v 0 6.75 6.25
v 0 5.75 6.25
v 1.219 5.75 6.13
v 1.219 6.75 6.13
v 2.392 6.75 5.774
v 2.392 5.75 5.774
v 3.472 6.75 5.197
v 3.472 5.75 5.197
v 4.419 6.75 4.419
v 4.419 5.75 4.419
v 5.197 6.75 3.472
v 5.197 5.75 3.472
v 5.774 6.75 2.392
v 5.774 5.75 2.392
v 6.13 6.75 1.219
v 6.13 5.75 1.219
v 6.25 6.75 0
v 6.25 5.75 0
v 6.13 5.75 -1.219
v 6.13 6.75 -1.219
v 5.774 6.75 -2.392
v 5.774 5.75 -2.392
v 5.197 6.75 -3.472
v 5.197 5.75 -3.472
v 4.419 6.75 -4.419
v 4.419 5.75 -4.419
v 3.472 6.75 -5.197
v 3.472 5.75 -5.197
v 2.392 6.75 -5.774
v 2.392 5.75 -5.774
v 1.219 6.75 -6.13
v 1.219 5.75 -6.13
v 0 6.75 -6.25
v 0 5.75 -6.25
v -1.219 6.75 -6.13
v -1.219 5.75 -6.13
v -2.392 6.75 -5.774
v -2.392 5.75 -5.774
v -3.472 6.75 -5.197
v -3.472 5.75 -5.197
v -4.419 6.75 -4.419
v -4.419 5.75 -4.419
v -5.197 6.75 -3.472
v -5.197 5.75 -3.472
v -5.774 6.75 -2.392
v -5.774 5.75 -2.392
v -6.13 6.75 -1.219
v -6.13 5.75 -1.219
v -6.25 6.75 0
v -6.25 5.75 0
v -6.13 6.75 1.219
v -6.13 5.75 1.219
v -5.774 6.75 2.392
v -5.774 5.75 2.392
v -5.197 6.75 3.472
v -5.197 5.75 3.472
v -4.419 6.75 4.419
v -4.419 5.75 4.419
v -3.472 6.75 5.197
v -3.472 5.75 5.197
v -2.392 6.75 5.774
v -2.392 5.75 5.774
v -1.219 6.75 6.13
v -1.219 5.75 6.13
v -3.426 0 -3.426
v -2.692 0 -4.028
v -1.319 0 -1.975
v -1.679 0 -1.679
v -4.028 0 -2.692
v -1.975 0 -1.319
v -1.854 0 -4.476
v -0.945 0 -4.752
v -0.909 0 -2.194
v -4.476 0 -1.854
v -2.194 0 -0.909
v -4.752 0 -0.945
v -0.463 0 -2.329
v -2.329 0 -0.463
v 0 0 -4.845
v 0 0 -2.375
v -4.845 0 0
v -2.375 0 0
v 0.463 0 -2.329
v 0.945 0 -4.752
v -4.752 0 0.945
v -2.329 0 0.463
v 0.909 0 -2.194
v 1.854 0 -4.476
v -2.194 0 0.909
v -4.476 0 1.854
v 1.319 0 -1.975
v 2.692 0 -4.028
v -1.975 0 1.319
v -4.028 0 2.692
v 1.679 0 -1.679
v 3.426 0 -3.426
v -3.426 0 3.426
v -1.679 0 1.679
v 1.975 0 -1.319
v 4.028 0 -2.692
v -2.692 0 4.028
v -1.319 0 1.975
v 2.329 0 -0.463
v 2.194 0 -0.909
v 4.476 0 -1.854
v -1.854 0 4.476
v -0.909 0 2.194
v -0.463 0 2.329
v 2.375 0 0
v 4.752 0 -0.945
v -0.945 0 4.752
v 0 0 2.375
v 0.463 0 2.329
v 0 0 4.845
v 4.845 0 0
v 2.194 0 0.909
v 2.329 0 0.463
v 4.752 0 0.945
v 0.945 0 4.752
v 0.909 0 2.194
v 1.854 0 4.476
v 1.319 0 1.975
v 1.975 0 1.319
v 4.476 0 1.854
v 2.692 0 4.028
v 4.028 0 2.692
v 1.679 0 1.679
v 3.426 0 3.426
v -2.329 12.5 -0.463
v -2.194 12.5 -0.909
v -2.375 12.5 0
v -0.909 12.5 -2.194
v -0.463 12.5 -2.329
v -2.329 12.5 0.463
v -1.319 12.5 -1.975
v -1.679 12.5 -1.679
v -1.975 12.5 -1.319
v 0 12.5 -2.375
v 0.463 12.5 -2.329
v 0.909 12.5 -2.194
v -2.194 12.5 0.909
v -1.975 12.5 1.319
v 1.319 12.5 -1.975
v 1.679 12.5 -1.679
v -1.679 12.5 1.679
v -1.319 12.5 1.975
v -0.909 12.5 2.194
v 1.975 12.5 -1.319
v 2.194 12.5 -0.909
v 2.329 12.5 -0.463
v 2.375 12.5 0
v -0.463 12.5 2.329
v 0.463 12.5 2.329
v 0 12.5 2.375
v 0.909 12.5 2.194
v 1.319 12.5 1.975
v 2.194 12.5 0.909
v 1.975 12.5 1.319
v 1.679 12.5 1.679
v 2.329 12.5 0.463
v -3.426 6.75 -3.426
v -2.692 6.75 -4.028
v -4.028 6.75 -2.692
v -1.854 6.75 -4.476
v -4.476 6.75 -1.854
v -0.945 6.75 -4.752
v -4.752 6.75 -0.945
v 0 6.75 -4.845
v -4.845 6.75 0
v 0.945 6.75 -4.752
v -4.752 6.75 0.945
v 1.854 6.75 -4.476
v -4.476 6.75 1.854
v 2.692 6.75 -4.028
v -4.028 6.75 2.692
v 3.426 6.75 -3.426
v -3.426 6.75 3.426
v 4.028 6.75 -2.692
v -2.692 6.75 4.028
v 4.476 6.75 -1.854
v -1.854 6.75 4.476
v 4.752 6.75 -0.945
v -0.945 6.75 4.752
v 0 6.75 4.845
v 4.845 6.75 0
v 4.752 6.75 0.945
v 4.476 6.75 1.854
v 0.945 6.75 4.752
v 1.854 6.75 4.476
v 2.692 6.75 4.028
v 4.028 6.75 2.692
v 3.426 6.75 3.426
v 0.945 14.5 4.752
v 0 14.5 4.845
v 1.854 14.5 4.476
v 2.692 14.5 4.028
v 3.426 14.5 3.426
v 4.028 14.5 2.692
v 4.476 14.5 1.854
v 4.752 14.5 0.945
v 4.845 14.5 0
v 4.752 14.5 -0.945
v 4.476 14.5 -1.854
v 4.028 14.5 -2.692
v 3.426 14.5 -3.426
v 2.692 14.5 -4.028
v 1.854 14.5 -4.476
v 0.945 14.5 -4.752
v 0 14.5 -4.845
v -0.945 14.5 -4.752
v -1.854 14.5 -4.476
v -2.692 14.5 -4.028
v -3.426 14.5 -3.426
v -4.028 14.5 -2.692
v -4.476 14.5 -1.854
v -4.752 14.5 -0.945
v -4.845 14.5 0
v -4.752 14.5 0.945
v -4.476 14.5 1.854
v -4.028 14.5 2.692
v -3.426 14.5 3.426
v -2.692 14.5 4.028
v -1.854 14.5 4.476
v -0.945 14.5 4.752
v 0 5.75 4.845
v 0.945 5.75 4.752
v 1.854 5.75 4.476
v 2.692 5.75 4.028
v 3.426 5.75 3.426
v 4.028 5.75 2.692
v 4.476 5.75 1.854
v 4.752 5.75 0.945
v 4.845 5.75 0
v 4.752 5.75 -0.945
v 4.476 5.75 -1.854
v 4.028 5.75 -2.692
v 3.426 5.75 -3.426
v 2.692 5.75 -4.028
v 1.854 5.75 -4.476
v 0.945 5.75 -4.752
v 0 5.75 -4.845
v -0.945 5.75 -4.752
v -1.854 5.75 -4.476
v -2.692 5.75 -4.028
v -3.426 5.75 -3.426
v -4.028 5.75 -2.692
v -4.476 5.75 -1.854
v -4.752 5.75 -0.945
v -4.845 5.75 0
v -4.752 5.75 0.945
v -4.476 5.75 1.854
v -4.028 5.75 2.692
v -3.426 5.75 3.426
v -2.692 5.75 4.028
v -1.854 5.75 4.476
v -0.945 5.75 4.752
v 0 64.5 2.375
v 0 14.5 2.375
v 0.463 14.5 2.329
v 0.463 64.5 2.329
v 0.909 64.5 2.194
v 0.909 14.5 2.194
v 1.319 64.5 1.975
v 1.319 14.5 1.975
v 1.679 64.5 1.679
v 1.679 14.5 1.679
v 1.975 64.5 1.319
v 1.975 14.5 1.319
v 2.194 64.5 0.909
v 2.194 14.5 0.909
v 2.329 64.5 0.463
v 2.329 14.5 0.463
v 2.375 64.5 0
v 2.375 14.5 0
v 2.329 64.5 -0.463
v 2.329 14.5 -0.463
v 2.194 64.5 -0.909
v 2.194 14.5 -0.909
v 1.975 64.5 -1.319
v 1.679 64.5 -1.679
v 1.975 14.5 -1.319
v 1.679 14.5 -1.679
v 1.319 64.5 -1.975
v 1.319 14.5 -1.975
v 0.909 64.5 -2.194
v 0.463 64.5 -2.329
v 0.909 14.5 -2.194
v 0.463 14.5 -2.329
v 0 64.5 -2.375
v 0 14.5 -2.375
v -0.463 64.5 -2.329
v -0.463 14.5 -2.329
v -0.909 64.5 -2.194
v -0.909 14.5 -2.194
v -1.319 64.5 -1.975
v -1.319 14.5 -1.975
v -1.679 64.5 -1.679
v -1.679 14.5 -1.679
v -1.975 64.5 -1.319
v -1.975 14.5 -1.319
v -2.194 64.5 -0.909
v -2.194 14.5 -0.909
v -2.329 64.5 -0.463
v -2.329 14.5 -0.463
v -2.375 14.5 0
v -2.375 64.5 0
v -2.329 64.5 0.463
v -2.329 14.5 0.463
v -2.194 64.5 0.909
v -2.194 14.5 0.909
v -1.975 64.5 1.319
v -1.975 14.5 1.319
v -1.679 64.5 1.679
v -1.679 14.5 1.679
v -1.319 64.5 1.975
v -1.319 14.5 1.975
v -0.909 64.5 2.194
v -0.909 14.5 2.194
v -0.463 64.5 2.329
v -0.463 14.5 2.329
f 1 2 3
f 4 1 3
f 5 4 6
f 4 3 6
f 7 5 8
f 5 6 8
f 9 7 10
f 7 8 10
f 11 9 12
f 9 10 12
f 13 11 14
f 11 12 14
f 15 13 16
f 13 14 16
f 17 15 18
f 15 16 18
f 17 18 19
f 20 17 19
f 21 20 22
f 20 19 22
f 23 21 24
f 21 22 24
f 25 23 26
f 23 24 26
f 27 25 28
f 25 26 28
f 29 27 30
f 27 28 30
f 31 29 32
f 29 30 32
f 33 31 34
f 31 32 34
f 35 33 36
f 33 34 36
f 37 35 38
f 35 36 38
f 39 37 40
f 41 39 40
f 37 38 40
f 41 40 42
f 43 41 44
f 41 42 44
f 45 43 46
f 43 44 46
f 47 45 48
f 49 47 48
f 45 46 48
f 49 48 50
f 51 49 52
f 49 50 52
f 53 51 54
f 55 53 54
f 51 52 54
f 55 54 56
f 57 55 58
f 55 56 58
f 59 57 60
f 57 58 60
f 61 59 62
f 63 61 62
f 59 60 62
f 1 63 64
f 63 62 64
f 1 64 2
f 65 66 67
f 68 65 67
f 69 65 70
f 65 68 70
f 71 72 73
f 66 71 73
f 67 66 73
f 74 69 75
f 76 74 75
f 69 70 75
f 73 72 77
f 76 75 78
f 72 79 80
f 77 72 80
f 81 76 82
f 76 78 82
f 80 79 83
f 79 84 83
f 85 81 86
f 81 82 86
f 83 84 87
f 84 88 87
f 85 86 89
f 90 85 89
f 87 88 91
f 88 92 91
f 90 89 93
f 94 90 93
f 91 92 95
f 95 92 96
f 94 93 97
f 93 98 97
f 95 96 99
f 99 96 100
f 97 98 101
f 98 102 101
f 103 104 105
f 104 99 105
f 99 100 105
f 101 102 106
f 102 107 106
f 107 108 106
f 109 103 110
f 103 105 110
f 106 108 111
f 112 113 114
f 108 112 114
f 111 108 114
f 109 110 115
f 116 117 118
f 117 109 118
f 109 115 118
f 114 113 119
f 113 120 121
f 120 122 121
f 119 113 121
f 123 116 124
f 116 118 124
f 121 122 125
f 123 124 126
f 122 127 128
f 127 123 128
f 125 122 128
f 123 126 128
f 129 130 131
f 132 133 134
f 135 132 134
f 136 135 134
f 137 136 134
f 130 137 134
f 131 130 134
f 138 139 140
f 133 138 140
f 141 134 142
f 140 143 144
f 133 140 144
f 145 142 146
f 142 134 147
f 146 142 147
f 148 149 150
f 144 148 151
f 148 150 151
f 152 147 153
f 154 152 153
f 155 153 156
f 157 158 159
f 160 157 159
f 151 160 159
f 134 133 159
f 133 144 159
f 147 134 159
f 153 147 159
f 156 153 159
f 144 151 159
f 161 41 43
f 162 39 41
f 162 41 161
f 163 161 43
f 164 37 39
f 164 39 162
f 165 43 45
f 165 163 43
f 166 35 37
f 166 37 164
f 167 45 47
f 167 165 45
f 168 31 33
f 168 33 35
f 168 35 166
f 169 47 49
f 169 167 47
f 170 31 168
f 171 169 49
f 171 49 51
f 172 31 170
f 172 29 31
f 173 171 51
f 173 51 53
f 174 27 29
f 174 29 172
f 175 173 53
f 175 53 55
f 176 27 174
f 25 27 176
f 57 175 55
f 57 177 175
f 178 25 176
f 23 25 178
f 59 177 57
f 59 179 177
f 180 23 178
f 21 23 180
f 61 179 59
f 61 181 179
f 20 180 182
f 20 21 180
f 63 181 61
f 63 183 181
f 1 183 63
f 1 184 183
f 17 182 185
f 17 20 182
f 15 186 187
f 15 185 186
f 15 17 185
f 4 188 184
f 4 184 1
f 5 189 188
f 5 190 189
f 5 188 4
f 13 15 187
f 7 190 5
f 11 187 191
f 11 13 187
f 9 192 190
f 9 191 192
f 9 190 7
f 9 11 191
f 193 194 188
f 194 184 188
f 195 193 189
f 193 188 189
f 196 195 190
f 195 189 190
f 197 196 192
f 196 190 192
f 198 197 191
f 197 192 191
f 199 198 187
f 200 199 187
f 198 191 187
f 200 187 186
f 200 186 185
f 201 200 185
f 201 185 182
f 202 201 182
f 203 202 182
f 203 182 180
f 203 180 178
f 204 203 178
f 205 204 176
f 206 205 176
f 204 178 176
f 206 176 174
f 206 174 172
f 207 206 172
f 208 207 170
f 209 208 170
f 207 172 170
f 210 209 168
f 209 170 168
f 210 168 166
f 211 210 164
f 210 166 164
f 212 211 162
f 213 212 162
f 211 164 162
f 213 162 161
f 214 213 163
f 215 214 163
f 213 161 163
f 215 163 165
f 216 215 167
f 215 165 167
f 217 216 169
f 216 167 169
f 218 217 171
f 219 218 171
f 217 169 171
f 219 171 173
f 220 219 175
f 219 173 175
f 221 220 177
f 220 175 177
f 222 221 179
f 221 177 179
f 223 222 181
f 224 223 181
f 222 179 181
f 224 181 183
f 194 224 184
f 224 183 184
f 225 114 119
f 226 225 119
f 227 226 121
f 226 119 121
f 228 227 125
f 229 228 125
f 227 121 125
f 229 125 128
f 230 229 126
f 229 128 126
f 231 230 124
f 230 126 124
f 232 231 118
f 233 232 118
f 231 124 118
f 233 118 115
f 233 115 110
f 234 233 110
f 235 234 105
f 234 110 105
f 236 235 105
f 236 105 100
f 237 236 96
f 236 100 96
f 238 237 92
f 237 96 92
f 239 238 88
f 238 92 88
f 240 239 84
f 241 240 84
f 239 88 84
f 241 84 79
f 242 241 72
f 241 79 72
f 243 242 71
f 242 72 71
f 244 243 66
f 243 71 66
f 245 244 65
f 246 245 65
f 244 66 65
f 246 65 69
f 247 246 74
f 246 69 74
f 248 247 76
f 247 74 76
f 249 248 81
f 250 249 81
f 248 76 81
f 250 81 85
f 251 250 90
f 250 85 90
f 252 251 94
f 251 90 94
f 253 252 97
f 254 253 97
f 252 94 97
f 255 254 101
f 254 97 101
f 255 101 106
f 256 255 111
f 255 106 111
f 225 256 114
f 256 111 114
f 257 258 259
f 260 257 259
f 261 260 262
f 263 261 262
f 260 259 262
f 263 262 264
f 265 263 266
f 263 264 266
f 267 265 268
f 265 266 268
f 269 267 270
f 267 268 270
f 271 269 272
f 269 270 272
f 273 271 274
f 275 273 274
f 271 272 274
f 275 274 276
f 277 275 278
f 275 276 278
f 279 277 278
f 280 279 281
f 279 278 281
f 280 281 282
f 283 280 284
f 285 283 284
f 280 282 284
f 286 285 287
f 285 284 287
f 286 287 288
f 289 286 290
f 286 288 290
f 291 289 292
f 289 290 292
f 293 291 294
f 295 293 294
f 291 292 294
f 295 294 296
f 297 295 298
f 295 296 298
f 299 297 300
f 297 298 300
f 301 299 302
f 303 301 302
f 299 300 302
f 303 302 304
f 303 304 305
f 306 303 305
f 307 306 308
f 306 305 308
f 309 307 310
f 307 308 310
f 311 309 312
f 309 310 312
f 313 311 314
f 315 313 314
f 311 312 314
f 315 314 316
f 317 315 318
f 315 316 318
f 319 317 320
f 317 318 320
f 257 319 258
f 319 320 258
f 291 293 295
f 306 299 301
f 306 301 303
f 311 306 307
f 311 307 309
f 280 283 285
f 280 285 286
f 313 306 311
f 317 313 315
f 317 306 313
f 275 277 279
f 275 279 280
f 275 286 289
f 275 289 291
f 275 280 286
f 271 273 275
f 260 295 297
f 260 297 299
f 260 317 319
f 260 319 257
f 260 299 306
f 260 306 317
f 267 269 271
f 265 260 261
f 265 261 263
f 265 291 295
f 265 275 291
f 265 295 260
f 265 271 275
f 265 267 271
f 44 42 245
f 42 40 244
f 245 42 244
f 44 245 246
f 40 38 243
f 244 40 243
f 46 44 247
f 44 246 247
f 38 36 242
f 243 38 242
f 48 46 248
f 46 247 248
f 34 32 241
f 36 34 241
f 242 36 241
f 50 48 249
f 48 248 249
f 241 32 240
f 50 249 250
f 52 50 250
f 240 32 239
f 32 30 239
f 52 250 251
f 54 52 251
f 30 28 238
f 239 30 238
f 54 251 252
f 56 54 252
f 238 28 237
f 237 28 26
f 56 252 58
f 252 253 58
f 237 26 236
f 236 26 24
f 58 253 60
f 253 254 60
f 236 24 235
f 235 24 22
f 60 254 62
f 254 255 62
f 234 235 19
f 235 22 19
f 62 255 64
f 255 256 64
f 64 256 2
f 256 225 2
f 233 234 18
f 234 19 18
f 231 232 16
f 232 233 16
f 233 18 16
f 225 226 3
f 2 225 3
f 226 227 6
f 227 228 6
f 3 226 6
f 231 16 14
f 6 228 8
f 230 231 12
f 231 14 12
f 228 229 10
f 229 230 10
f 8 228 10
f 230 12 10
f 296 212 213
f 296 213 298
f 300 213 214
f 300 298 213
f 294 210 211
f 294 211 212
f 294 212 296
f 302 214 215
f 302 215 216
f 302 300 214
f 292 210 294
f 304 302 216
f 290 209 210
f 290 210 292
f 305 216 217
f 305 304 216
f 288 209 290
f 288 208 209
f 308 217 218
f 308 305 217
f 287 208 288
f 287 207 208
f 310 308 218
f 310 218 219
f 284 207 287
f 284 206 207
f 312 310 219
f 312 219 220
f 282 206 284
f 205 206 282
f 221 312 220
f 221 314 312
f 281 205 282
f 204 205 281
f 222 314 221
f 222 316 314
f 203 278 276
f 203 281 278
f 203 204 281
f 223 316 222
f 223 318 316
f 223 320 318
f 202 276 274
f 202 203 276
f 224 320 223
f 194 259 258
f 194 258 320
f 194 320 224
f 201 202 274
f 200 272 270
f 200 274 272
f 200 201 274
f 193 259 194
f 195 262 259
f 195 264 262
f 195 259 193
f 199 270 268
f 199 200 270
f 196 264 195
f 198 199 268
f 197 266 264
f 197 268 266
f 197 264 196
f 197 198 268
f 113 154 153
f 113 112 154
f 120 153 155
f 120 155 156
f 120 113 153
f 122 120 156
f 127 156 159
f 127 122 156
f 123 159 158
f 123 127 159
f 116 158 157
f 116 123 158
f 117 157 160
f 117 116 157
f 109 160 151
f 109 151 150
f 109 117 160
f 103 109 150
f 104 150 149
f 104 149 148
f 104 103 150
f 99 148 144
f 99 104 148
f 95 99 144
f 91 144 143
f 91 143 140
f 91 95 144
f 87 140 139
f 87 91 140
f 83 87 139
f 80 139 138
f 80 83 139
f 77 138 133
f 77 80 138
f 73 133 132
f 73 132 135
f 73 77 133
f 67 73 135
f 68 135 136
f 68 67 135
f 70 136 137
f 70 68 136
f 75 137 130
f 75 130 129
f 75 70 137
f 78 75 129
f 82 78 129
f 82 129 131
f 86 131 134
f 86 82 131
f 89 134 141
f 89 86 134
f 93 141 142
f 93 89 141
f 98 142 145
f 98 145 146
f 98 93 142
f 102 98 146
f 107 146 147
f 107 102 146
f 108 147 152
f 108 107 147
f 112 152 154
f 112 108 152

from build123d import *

# Parameters (mm, degrees)
SKETCH1_R           = 4.845
SKETCH1_R_2         = 2.375
BOSS_EXTRUDE1_DEPTH = 5.75
SKETCH4_R           = 6.25
SKETCH4_R_2         = 2.375
BOSS_EXTRUDE4_DEPTH = 1
SKETCH5_R           = 4.845
SKETCH5_R_2         = 2.375
BOSS_EXTRUDE5_DEPTH = 5.75
SKETCH6_R           = 4.845
BOSS_EXTRUDE6_DEPTH = 2
SKETCH7_R           = 2.375
BOSS_EXTRUDE7_DEPTH = 50


with BuildPart() as part:
    # Sketch1 → Boss-Extrude1 (new body)
    with BuildSketch(Plane(origin=(0, 0, 0), x_dir=(1, 0, 0), z_dir=(0, 1, 0))):
        with Locations(Location((0, 0, 0), (0, 0, 270))):
            Circle(SKETCH1_R)
        with Locations(Location((0, 0, 0), (0, 0, 270))):
            Circle(SKETCH1_R_2, mode=Mode.SUBTRACT)
    extrude(amount=BOSS_EXTRUDE1_DEPTH)

    # Sketch4 → Boss-Extrude4 (add)
    with BuildSketch(Plane(origin=(0, 5.75, 0), x_dir=(1, 0, 0), z_dir=(0, 1, 0))):
        with Locations(Location((0, 0, 0), (0, 0, 270))):
            Circle(SKETCH4_R)
        with Locations(Location((0, 0, 0), (0, 0, 270))):
            Circle(SKETCH4_R_2, mode=Mode.SUBTRACT)
    extrude(amount=BOSS_EXTRUDE4_DEPTH)

    # Sketch5 → Boss-Extrude5 (add)
    with BuildSketch(Plane(origin=(0, 6.75, 0), x_dir=(1, 0, 0), z_dir=(0, 1, 0))):
        with Locations(Location((0, 0, 0), (0, 0, 270))):
            Circle(SKETCH5_R)
        with Locations(Location((0, 0, 0), (0, 0, 270))):
            Circle(SKETCH5_R_2, mode=Mode.SUBTRACT)
    extrude(amount=BOSS_EXTRUDE5_DEPTH)

    # Sketch6 → Boss-Extrude6 (add)
    with BuildSketch(Plane(origin=(0, 12.5, 0), x_dir=(1, 0, 0), z_dir=(0, 1, 0))):
        with Locations(Location((0, 0, 0), (0, 0, 270))):
            Circle(SKETCH6_R)
    extrude(amount=BOSS_EXTRUDE6_DEPTH)

    # Sketch7 → Boss-Extrude7 (add)
    with BuildSketch(Plane(origin=(0, 14.5, 0), x_dir=(1, 0, 0), z_dir=(0, 1, 0))):
        with Locations(Location((0, 0, 0), (0, 0, 270))):
            Circle(SKETCH7_R)
    extrude(amount=BOSS_EXTRUDE7_DEPTH)


solid = part.part
